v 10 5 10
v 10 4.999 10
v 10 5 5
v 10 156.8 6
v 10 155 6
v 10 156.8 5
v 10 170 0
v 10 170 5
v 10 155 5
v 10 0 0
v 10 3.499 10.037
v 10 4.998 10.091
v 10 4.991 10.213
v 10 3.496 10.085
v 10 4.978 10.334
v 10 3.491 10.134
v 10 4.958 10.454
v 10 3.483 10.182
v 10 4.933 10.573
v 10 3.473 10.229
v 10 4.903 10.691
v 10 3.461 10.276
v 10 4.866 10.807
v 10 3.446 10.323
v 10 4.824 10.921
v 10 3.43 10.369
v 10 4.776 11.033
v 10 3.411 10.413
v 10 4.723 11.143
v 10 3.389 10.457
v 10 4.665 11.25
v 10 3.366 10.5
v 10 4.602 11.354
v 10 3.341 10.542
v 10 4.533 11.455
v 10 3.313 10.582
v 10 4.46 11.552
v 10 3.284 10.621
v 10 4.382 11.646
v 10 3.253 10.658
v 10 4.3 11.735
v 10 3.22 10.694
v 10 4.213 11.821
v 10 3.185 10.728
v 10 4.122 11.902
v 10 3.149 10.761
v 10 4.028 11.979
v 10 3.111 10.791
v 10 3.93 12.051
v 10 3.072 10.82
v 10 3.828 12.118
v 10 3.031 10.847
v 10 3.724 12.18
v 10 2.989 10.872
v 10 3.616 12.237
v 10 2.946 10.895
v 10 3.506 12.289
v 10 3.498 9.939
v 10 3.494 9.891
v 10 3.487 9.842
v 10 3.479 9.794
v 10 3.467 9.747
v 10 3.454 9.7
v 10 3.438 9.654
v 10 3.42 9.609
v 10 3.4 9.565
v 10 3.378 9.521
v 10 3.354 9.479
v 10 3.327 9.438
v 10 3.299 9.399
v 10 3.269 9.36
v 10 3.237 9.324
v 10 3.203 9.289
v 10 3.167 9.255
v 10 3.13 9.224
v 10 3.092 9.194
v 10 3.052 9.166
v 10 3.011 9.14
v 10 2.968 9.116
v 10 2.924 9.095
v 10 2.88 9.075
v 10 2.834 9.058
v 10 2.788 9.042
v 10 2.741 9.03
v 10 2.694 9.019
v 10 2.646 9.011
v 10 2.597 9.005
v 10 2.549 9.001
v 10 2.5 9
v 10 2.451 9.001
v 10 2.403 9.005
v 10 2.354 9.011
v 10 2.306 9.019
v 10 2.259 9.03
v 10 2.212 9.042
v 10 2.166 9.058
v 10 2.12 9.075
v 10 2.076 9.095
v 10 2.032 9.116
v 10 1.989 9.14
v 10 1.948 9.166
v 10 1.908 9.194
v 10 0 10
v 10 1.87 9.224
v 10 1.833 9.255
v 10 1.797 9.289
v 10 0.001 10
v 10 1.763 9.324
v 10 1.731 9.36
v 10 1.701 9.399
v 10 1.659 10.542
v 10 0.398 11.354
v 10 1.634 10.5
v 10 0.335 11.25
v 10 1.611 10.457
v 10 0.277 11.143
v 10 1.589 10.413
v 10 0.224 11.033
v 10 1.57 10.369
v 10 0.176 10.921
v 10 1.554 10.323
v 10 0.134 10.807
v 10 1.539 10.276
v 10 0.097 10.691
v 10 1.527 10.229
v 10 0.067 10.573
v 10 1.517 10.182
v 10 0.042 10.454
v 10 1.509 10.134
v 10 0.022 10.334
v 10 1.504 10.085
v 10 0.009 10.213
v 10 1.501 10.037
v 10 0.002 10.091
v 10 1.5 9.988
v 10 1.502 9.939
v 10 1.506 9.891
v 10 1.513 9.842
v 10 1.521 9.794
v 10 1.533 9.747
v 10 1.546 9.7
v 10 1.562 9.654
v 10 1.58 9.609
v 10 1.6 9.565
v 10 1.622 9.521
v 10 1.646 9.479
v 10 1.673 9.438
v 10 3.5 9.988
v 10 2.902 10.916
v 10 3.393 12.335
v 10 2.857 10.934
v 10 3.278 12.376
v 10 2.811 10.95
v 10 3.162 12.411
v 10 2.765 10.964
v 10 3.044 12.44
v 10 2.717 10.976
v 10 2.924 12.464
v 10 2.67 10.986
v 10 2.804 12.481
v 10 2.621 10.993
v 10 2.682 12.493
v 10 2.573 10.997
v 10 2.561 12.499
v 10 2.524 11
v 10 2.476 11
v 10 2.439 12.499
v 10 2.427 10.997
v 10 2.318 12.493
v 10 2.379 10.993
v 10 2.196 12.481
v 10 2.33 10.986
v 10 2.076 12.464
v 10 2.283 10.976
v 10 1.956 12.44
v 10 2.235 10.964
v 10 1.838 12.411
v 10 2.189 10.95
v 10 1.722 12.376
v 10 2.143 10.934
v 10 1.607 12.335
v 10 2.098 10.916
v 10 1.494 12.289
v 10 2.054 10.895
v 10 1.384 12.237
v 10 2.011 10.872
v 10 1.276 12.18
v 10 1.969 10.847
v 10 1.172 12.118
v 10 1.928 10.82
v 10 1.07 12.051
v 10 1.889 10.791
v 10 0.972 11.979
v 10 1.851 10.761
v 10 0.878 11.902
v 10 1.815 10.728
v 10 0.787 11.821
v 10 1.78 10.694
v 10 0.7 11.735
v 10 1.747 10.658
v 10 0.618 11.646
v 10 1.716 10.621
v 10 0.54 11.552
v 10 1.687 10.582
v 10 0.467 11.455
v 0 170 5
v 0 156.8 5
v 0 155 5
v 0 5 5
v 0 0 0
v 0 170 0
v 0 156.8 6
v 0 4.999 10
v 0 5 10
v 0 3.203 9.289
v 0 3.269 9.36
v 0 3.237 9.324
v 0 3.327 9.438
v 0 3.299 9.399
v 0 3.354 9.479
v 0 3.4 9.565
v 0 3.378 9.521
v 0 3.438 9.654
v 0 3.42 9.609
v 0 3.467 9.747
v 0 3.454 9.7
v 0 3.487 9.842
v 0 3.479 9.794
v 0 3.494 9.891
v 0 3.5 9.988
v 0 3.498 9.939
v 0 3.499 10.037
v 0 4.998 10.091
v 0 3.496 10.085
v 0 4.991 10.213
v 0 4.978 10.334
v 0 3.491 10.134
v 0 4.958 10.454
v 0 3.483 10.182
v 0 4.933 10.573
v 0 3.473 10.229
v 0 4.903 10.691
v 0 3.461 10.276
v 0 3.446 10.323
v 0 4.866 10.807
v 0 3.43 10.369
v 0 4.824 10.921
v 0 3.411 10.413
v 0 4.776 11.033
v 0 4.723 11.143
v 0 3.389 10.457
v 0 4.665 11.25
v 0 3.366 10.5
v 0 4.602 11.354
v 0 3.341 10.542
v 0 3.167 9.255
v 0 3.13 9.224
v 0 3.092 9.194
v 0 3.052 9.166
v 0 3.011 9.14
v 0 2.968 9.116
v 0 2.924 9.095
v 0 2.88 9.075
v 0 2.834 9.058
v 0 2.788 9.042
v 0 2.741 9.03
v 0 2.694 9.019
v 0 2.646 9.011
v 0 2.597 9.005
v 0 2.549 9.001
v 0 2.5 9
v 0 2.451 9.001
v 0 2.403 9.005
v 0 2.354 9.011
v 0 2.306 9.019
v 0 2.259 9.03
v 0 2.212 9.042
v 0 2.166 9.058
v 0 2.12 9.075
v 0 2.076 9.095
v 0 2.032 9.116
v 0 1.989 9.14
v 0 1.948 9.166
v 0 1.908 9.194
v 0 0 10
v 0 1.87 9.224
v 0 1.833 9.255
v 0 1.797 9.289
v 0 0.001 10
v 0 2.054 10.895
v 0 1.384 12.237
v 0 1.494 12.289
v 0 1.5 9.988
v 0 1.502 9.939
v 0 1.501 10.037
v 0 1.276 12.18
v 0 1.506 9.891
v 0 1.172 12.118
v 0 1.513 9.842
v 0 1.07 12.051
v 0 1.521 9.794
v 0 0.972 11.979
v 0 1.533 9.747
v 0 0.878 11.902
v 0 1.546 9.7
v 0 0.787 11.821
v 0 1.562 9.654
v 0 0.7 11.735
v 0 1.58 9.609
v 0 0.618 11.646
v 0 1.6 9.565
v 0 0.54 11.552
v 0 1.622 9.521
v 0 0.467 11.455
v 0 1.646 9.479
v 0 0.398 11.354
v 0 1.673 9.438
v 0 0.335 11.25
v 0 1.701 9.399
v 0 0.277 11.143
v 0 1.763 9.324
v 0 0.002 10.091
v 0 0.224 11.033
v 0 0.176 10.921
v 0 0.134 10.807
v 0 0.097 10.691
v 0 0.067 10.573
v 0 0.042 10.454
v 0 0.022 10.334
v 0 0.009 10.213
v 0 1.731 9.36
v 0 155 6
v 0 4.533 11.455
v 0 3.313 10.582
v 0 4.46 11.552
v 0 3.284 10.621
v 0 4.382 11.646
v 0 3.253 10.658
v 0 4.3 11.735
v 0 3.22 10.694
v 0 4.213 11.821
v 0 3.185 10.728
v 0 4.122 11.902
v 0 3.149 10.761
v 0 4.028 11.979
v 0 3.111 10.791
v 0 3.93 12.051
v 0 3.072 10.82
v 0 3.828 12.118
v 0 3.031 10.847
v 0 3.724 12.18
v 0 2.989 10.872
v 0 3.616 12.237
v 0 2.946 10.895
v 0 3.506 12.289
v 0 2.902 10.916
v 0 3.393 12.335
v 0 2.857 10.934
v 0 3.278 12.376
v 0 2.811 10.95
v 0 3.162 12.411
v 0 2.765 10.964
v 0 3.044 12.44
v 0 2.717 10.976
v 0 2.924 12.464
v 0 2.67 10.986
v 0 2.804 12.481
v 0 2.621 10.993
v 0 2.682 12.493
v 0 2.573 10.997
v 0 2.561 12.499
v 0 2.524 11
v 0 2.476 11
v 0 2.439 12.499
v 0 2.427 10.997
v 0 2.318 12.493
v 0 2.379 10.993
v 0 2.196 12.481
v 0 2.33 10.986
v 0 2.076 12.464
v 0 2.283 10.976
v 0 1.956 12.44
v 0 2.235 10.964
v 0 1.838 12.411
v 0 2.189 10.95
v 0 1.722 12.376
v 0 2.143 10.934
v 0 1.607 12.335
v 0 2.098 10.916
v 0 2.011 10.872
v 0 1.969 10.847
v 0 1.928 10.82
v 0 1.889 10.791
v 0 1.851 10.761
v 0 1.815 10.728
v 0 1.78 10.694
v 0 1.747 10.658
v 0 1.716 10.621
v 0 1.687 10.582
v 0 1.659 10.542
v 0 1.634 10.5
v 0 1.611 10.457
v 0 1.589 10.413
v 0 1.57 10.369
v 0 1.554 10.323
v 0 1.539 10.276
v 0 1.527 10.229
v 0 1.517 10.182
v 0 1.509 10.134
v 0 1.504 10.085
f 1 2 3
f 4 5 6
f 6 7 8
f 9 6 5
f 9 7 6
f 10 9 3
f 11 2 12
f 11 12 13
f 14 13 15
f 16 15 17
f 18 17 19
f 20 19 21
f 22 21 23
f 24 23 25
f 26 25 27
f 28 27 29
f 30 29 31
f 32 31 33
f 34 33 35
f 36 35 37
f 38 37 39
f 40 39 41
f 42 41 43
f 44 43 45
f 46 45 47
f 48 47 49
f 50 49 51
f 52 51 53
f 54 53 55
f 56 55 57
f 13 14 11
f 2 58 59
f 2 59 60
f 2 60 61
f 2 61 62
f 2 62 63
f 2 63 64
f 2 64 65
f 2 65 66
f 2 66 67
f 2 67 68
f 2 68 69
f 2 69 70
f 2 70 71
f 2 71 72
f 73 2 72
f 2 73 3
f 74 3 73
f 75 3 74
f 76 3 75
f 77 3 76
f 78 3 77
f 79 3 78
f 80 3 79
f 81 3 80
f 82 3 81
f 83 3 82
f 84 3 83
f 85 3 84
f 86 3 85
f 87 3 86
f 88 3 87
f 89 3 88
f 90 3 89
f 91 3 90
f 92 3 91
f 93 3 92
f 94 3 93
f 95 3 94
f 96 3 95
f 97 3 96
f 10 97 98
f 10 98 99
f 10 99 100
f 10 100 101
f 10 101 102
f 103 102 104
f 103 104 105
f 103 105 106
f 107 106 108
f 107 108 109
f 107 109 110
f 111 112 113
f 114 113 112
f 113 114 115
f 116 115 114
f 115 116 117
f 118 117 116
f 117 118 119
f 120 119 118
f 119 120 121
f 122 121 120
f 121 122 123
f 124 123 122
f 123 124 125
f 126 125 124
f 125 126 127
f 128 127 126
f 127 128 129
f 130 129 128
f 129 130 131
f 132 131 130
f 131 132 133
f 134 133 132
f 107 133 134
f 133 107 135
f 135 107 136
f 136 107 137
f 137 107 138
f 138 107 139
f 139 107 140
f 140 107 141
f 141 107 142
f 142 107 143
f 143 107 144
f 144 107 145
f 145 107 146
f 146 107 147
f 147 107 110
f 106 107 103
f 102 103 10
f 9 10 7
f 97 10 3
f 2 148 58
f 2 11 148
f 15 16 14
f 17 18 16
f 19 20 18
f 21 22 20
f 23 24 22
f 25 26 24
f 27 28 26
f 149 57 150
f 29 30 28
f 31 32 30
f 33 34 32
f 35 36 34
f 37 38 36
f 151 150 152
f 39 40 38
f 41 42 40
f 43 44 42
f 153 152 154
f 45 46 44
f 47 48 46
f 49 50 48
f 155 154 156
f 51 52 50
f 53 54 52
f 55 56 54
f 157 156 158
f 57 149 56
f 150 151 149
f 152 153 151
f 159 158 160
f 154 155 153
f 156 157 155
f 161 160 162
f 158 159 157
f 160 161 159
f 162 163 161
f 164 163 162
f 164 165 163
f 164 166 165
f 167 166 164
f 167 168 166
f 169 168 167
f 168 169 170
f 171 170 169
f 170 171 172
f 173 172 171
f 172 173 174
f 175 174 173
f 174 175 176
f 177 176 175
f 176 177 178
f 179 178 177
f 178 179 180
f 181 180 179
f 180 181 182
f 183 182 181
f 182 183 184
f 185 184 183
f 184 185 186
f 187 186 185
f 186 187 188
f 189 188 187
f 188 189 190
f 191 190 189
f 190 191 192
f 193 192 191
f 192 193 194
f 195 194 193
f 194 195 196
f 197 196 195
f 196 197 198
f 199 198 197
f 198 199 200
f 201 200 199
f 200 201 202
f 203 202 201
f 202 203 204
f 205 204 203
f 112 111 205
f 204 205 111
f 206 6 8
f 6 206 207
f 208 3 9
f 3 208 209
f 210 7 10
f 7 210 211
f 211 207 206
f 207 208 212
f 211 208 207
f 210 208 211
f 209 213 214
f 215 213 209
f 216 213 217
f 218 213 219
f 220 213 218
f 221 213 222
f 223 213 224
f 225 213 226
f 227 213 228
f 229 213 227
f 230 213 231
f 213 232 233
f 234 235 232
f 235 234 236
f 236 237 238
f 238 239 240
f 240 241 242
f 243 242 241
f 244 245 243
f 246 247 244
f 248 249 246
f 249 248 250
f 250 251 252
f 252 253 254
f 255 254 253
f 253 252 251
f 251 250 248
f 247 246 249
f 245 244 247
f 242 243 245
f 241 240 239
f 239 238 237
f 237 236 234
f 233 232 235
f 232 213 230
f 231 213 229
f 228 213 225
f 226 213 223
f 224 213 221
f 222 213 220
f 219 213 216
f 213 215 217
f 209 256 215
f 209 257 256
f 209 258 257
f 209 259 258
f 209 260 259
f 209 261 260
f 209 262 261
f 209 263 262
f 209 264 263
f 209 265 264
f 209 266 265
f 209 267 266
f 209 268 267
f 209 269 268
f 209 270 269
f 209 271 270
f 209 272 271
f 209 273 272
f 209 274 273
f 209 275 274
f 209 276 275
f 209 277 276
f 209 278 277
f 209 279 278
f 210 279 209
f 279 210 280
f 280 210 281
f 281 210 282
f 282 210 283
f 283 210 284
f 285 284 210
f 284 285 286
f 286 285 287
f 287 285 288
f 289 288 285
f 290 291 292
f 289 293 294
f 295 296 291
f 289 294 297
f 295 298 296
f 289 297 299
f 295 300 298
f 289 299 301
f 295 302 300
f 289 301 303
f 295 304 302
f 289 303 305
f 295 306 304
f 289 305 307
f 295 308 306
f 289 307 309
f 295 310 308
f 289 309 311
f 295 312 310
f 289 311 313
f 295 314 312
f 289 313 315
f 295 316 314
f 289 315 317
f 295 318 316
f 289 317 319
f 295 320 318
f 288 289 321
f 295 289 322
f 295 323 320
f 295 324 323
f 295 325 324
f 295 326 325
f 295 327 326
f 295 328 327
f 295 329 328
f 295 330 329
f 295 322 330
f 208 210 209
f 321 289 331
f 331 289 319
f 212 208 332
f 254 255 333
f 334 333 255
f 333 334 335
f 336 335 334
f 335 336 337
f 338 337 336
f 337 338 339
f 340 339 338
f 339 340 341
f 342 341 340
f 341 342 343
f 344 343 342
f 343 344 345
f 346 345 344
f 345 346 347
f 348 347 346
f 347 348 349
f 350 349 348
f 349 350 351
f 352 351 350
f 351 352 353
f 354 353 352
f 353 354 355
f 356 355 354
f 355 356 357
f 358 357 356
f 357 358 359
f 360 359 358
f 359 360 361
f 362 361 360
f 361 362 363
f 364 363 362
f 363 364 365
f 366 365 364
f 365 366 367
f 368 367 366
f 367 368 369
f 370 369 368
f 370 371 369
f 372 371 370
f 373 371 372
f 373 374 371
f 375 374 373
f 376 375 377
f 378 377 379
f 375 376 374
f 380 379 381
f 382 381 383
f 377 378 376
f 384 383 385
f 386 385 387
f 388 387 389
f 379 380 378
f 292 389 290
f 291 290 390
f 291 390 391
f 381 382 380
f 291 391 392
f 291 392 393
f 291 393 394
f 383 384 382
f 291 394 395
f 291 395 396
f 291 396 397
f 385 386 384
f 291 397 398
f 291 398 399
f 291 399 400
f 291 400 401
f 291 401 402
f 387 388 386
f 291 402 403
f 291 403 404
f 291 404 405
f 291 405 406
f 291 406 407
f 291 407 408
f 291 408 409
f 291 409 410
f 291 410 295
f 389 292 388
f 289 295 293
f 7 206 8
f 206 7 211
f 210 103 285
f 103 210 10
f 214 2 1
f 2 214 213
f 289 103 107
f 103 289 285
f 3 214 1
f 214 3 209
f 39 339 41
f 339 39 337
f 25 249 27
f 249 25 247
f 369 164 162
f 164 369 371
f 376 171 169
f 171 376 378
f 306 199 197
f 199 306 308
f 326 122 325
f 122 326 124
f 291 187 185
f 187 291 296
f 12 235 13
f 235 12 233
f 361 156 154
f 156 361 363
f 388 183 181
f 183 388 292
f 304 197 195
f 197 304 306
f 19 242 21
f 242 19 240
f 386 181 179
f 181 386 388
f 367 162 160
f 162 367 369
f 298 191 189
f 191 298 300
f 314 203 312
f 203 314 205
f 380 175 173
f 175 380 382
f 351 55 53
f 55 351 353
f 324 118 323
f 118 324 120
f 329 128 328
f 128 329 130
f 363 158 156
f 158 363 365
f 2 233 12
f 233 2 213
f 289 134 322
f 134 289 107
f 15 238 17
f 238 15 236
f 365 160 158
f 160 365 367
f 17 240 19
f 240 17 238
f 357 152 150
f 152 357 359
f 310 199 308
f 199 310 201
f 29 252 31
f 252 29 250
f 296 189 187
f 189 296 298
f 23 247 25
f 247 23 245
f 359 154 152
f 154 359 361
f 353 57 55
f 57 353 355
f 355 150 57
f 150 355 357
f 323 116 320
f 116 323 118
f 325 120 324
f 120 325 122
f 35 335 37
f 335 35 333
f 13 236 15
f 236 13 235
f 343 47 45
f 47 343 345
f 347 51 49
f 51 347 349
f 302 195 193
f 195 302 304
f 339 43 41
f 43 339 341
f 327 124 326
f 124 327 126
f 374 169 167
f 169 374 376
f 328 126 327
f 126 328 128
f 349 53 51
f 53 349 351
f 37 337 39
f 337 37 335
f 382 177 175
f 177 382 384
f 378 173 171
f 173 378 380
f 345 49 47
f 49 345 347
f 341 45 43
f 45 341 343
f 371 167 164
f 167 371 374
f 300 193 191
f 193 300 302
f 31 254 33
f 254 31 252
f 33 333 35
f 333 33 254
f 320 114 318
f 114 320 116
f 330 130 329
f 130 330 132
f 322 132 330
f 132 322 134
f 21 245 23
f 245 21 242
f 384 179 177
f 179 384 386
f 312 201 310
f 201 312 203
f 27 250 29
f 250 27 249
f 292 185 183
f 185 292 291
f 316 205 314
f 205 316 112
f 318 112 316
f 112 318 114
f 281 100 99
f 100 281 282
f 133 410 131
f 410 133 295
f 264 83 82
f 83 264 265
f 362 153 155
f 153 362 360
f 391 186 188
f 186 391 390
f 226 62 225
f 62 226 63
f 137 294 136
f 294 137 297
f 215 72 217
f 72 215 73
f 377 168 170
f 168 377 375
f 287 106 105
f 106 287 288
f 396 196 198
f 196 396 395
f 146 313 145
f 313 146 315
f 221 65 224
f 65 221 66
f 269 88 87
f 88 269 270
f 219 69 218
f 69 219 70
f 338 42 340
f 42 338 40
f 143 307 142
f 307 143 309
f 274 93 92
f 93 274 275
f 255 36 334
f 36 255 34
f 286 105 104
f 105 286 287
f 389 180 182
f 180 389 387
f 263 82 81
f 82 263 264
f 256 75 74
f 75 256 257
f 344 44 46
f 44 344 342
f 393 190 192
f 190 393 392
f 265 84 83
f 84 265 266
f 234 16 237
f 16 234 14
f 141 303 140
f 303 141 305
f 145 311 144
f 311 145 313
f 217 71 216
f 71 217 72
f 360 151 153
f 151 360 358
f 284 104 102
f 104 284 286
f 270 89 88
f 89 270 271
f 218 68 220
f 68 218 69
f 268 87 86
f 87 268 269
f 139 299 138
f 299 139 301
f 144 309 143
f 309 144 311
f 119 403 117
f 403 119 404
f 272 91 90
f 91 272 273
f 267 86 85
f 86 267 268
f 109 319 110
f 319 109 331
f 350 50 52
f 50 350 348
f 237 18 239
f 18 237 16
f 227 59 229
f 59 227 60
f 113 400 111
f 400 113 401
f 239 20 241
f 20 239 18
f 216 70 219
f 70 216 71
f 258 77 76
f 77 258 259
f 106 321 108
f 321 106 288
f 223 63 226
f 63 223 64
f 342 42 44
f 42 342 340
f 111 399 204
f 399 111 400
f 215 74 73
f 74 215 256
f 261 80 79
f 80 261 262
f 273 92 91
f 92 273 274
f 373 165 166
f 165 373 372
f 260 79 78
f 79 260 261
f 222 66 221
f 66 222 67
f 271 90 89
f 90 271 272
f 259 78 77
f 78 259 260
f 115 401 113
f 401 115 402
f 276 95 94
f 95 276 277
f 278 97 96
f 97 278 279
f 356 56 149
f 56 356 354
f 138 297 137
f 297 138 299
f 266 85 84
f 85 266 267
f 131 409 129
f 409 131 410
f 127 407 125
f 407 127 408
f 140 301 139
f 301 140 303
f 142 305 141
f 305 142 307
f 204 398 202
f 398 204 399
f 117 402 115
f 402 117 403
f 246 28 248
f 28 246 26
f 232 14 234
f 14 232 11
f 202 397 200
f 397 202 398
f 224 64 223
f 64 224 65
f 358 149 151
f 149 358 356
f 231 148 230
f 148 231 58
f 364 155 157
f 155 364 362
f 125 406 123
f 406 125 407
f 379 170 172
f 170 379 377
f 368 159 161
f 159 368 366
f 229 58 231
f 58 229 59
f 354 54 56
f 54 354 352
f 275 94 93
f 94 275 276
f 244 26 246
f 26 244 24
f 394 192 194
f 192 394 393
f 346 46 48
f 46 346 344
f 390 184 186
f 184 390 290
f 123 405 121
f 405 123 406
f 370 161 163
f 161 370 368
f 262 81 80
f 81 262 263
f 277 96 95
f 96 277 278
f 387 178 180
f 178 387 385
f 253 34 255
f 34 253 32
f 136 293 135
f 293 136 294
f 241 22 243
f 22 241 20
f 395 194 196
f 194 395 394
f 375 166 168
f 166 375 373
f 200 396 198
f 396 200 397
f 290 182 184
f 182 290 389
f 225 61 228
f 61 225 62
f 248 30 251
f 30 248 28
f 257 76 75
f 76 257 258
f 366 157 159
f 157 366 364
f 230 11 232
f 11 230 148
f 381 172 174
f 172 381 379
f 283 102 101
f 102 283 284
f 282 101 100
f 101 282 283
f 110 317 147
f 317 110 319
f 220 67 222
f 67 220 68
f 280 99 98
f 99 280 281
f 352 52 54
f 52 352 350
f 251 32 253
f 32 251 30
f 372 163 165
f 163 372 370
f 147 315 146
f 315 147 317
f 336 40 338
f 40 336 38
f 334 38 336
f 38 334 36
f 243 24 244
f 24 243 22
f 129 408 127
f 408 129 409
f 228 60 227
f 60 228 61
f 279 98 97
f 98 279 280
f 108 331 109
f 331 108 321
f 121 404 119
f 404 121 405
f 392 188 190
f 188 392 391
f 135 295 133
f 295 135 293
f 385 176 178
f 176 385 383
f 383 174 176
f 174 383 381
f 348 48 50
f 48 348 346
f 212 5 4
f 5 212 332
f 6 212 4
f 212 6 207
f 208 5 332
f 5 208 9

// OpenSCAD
$fn=129;
difference()
{
    union()
    {
        cube([10,170,5]);
        cube([10,5,10]);
        translate([0,2.5,10]) rotate([0,90,0]) cylinder(d=5,h=10);
    }
    translate([-5,2.5,10]) rotate([0,90,0]) cylinder(d=2,h=20);
}
translate([0,155,4]) cube([10,1.8,2]);
